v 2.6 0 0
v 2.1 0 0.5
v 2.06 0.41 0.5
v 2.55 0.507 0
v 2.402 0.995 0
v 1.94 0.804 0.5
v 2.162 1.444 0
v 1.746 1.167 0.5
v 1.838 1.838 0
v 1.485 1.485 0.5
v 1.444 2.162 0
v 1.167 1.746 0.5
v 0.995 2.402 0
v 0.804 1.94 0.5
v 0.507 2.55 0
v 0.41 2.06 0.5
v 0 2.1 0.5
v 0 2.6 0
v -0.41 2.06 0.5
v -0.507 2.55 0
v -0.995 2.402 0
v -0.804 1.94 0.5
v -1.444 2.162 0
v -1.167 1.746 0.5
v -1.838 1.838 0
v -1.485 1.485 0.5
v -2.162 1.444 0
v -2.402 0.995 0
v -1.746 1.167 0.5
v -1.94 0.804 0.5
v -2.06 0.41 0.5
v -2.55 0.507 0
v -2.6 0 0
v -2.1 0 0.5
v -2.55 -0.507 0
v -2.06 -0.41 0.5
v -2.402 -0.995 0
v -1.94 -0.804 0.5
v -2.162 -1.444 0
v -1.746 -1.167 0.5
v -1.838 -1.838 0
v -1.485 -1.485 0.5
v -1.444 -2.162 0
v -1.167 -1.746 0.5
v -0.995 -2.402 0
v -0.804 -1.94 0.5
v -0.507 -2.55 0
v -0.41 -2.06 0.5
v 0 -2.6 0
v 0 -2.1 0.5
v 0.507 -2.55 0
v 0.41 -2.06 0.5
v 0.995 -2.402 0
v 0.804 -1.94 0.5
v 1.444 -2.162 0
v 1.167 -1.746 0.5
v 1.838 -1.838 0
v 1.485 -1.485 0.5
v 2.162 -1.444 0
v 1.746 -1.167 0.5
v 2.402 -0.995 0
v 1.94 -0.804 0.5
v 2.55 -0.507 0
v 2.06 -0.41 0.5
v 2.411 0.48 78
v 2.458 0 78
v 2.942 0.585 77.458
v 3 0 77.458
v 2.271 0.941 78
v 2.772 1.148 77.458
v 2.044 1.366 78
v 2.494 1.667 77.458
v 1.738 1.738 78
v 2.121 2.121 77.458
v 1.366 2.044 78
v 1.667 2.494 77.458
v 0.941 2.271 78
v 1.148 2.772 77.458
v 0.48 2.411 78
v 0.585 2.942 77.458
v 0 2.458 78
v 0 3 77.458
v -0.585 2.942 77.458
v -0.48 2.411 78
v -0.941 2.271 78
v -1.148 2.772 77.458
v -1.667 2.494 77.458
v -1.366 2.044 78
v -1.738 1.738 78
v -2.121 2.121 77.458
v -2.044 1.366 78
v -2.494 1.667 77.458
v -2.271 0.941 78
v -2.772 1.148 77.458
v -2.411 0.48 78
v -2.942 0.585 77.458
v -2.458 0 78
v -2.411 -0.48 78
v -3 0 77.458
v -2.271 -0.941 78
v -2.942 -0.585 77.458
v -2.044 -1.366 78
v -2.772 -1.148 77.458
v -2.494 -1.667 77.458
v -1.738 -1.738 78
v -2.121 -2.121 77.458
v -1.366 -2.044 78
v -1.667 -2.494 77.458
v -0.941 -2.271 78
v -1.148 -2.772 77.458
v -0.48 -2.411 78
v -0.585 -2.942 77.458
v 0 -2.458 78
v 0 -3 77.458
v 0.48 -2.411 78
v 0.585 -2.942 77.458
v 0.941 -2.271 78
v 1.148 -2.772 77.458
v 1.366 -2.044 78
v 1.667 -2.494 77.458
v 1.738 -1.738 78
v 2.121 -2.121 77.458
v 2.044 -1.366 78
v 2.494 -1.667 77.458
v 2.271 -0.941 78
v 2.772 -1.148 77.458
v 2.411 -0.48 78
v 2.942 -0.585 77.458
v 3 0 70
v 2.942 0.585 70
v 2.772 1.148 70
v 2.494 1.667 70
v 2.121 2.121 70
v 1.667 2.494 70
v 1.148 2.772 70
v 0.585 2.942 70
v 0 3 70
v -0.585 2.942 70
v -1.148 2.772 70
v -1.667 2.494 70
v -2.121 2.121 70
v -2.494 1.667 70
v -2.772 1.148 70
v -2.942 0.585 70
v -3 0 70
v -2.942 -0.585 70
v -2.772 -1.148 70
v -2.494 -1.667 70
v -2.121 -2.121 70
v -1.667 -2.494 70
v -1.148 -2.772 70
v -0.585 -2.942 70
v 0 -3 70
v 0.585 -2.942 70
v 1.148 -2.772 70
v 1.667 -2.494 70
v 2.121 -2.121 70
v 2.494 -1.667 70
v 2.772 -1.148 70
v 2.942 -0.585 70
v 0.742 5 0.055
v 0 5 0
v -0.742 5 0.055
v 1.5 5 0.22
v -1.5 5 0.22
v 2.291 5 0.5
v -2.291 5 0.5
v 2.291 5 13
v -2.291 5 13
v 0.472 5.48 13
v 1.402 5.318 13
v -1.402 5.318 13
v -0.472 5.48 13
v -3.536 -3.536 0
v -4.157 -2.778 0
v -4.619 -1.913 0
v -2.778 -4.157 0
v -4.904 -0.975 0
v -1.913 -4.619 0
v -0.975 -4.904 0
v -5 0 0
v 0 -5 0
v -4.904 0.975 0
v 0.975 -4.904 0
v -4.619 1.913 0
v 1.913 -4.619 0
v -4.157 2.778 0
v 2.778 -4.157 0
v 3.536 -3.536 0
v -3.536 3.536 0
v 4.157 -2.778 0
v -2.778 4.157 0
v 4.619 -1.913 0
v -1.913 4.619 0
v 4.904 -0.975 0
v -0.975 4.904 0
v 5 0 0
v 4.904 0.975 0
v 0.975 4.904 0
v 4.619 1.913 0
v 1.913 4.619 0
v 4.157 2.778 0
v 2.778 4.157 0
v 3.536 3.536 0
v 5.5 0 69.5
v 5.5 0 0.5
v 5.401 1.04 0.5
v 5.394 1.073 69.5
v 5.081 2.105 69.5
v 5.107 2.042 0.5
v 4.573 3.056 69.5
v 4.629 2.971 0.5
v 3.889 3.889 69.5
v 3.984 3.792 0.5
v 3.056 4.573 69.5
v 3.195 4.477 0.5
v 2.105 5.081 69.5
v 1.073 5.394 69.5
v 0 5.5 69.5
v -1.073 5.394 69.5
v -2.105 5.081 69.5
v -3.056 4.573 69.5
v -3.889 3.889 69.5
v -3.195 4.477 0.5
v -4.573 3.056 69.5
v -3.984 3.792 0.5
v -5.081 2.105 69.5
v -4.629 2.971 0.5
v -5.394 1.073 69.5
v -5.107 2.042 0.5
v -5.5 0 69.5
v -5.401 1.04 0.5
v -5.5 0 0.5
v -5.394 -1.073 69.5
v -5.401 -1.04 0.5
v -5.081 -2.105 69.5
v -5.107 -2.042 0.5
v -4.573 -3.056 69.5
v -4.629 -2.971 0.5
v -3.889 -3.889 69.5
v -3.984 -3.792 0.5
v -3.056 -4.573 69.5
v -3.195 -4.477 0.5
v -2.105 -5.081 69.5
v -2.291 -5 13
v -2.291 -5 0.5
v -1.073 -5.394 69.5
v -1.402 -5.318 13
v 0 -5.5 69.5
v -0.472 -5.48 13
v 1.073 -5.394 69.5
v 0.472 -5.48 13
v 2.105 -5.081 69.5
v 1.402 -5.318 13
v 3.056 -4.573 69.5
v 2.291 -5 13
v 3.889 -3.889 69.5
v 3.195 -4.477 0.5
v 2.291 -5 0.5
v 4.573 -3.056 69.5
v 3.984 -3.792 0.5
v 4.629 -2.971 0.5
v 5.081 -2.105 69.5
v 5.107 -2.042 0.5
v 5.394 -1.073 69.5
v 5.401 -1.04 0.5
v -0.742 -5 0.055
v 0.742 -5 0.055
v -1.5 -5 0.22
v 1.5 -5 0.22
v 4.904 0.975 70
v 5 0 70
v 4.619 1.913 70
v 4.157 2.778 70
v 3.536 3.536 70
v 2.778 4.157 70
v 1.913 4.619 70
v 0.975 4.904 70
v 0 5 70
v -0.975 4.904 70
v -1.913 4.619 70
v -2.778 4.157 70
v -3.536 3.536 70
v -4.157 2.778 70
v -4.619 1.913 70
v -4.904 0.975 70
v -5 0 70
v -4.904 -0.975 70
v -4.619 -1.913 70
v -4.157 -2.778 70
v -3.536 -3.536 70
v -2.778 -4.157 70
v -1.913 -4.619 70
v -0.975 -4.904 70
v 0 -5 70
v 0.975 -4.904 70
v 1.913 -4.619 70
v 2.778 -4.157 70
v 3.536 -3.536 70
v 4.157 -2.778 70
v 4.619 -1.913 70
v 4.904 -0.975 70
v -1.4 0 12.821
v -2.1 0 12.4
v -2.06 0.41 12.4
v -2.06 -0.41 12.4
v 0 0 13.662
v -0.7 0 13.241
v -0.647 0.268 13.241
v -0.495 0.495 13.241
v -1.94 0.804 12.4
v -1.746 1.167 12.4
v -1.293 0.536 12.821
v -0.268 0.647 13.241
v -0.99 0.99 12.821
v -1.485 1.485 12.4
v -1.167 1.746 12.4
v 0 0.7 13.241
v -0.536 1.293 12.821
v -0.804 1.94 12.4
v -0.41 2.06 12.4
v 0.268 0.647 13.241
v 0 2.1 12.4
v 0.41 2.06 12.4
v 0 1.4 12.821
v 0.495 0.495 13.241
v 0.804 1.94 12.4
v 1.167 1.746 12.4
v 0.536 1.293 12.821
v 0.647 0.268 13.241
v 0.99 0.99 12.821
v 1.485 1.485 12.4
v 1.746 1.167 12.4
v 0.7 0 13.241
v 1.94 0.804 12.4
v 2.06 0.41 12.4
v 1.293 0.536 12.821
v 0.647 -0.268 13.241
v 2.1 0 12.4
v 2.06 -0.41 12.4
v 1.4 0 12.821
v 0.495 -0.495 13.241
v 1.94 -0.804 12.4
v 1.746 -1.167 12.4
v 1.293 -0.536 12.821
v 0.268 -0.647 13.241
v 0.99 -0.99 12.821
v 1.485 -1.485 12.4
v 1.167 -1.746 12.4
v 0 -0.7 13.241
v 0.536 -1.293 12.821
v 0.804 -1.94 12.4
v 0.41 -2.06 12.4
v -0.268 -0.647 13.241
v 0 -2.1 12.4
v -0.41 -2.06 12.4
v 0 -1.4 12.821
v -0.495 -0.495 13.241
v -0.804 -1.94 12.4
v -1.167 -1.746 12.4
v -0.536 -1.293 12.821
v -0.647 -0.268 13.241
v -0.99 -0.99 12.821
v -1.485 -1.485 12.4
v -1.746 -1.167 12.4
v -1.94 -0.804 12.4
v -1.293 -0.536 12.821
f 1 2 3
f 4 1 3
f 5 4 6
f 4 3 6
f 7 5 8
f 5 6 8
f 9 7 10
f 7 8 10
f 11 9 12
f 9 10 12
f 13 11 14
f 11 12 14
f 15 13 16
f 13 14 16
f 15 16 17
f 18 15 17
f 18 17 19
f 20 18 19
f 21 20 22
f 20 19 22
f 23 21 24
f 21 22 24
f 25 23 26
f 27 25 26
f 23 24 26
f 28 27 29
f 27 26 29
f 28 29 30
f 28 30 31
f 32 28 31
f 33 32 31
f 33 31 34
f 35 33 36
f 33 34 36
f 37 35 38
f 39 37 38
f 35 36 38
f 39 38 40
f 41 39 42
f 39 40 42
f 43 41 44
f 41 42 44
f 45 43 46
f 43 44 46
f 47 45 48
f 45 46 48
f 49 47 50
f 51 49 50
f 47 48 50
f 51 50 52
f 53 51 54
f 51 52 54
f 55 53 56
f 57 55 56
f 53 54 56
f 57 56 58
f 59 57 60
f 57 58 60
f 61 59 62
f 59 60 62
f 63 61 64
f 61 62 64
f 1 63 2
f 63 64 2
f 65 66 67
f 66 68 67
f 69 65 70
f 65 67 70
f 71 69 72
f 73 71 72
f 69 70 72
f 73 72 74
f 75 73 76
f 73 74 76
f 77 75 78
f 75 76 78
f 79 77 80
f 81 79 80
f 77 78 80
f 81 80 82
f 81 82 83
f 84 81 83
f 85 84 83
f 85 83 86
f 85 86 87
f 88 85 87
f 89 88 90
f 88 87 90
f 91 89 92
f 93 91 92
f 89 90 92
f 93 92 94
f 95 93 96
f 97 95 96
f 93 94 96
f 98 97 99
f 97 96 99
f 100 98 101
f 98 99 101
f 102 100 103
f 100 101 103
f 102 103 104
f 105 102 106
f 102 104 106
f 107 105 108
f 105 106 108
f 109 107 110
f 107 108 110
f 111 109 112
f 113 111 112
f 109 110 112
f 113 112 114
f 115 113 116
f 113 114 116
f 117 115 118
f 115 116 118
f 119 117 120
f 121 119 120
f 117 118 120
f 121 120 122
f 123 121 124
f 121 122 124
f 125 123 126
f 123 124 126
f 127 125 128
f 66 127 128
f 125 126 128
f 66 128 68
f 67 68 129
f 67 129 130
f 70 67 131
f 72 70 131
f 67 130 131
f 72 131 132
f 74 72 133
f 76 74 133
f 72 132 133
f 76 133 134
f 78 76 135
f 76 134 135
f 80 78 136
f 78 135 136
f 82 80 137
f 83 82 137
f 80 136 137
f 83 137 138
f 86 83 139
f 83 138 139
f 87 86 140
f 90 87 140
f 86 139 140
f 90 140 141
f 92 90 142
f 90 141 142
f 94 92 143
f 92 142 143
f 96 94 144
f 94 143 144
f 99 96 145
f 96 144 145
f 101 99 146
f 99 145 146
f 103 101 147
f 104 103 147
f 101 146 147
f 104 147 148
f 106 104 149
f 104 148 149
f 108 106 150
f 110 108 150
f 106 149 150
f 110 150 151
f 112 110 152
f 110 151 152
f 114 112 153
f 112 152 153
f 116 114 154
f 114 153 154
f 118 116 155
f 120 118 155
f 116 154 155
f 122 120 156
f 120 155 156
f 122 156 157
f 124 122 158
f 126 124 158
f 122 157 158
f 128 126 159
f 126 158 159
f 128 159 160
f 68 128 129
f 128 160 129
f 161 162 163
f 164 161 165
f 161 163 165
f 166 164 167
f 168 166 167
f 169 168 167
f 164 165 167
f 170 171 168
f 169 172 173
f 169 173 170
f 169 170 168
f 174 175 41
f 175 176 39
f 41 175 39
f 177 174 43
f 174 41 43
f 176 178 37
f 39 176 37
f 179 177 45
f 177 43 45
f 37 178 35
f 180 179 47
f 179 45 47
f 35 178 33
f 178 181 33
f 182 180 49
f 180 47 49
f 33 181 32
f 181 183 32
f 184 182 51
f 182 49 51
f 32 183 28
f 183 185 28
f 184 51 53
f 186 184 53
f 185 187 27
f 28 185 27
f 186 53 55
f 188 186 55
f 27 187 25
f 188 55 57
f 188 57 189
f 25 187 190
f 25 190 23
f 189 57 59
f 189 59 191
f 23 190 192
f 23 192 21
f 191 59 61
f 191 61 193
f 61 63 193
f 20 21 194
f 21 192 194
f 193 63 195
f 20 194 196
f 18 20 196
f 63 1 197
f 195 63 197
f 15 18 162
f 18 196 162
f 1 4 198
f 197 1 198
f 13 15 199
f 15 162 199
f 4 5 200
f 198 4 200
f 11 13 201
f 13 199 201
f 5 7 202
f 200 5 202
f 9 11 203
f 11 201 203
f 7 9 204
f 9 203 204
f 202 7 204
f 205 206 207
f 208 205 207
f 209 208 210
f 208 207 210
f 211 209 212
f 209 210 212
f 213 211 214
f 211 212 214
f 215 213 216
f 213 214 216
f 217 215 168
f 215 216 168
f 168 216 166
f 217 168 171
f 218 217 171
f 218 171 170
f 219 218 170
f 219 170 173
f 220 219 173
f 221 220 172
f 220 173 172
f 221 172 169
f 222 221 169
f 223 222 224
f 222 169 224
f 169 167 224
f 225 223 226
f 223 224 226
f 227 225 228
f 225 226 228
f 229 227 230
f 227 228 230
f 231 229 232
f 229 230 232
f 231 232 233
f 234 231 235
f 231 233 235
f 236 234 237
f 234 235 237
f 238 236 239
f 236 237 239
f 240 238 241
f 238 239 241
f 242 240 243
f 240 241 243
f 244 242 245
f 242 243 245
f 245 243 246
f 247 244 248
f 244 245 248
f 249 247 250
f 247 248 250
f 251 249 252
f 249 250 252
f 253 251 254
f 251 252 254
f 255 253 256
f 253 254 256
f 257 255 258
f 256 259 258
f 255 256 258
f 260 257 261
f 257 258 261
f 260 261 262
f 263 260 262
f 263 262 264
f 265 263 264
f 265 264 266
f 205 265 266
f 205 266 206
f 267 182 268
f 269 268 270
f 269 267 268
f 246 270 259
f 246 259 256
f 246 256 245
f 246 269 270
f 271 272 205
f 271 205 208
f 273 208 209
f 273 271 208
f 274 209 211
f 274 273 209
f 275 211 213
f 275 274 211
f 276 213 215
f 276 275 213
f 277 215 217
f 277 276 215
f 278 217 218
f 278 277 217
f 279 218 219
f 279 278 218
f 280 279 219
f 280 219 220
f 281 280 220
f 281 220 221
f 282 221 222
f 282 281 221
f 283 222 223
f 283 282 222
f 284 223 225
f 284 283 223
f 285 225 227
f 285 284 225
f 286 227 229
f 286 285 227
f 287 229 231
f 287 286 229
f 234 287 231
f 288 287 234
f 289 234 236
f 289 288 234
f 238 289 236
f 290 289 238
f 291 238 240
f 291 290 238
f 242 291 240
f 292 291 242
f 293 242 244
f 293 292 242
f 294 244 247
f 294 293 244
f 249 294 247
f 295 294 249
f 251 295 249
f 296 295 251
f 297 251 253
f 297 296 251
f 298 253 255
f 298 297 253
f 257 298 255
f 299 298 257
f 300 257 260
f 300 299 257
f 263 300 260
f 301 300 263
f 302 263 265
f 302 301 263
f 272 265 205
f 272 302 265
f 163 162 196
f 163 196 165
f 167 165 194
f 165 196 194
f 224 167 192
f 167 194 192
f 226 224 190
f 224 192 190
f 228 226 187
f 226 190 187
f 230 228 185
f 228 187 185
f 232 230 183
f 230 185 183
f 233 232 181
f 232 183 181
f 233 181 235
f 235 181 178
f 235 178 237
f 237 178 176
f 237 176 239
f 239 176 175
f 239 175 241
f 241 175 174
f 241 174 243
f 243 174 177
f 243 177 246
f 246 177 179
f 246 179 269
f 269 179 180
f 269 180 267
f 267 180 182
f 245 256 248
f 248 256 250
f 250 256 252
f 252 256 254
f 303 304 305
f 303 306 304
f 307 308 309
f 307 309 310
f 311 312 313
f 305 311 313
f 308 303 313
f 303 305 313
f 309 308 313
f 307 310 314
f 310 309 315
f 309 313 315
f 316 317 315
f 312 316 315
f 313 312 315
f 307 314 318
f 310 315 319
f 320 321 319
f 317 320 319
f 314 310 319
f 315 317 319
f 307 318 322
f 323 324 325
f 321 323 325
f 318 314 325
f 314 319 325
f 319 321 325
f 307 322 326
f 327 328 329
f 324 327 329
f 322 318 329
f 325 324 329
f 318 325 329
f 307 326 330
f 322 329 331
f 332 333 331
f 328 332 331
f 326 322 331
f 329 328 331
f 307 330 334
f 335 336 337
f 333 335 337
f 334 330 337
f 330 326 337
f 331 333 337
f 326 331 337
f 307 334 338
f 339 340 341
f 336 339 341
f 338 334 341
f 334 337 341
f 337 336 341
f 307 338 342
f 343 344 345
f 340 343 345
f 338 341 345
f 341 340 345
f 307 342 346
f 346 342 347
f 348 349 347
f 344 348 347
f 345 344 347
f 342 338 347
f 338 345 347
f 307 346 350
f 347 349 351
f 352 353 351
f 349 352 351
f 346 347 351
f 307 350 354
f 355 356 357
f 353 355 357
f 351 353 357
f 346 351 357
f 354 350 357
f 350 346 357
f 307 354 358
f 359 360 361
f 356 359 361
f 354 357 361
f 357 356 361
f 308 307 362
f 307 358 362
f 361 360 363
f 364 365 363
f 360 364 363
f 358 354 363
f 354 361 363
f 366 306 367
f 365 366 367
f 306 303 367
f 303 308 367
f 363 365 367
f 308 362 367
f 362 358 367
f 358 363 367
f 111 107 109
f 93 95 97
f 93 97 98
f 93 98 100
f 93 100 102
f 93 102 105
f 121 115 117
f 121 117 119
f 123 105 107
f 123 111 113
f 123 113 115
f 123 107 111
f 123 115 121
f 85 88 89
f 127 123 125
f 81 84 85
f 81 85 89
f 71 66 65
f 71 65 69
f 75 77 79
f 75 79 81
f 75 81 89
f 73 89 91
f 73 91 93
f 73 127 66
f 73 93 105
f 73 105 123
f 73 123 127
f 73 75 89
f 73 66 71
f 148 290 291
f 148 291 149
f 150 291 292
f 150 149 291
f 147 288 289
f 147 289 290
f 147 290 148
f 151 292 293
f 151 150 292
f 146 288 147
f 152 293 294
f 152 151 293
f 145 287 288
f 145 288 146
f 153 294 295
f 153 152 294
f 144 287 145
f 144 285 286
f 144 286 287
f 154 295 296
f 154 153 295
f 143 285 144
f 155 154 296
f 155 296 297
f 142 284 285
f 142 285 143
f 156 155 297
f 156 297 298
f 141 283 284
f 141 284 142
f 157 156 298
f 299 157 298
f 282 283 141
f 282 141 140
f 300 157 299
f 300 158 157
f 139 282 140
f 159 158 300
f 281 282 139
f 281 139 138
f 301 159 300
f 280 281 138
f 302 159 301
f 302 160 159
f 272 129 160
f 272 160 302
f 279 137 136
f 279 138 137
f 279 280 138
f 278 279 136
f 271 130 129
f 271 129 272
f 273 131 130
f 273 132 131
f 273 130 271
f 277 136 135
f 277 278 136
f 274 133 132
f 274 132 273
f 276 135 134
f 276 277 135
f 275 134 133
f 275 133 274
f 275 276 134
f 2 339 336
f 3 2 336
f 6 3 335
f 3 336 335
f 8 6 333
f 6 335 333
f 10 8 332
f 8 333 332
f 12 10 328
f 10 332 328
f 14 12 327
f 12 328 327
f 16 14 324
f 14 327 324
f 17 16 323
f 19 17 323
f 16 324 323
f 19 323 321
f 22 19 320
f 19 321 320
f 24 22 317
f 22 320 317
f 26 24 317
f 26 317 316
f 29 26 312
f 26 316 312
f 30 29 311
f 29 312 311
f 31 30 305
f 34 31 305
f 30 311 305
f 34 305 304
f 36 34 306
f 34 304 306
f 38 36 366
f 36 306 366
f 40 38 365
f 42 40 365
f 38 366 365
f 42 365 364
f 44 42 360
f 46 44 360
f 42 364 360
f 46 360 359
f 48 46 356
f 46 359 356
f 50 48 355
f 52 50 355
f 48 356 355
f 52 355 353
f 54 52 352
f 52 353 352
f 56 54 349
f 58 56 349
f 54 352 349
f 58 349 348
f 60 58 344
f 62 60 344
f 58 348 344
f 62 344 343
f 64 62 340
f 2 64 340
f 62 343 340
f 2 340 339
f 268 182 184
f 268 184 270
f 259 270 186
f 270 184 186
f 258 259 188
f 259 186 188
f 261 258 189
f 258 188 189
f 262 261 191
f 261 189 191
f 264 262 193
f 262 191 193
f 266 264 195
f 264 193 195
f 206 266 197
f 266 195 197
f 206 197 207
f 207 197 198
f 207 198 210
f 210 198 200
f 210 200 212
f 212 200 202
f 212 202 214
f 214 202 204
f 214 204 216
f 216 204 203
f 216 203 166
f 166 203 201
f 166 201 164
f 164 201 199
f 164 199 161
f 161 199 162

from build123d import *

# Parameters (mm, degrees)
SKETCH_1_R             = 5.5
EXTRUDE_1_DEPTH        = 70
CHAMFER_1_SIZE         = 0.5
SKETCH_2_R             = 3.3
EXTRUDE_2_DEPTH        = 8
HOLE_WIZARD_M5_1_D     = 4.2
HOLE_WIZARD_M5_1_DEPTH = 12.4
HOLE_WIZARD_M5_1_TIP   = 1.2618073
CHAMFER_3_SIZE         = 0.5
SKETCH_6_W             = 10
SKETCH_6_H             = 3
CUT_EXTRUDE_1_DEPTH    = 13


# Read off the part's stored shape, not the designer's step: M6 机械螺纹 螺柱1
with BuildPart() as part:
    # 草图1 → 拉伸1 (new body)
    with BuildSketch(Plane.XY):
        Circle(SKETCH_1_R)
    extrude(amount=EXTRUDE_1_DEPTH)

    # 倒角1
    chamfer_1_edges = [part.edges().sort_by_distance(p)[0] for p in [
        (-5.5, 0, 0),
        (-5.5, 0, 70),
    ]]
    chamfer(chamfer_1_edges, length=CHAMFER_1_SIZE)

    # 草图2 → 拉伸2 (add)
    with BuildSketch(Plane.XY.offset(70)):
        Circle(SKETCH_2_R)
    extrude(amount=EXTRUDE_2_DEPTH)

    # M5 螺纹孔1
    with Locations(Plane(origin=(0, 0, 0), x_dir=(-1, 0, 0), z_dir=(0, 0, -1))):
        with Locations((0, 0)):
            Hole(HOLE_WIZARD_M5_1_D / 2, depth=HOLE_WIZARD_M5_1_DEPTH)
            with Locations((0, 0, -(HOLE_WIZARD_M5_1_DEPTH + HOLE_WIZARD_M5_1_TIP / 2))):  # 118° drill point
                Cone(0, HOLE_WIZARD_M5_1_D / 2, HOLE_WIZARD_M5_1_TIP, mode=Mode.SUBTRACT)

    # 倒角3
    chamfer_3_edges = [part.edges().sort_by_distance(p)[0] for p in [
        (-2.1, 0, 0),
    ]]
    chamfer(chamfer_3_edges, length=CHAMFER_3_SIZE)

    # 草图6 → 切除-拉伸1 (cut)
    with BuildSketch(Plane(origin=(0, 0, 0), x_dir=(-1, 0, 0), z_dir=(0, 0, -1))):
        with Locations((0, 6.5)):
            Rectangle(SKETCH_6_W, SKETCH_6_H)
        with Locations((0, -6.5)):
            Rectangle(SKETCH_6_W, SKETCH_6_H)
    extrude(amount=-CUT_EXTRUDE_1_DEPTH, mode=Mode.SUBTRACT)

    # M6 机械螺纹 螺柱1 outline → M6 机械螺纹 螺柱1 (revolve, cut)
    with BuildSketch(Plane.XZ):
        Polygon((3.3, 78), (2.4585, 78), (3, 77.4585), (3, 70), (3.3, 70), align=None)
    revolve(axis=Axis((0, 0, 0), (0, 0, 1)), mode=Mode.SUBTRACT)


solid = part.part
